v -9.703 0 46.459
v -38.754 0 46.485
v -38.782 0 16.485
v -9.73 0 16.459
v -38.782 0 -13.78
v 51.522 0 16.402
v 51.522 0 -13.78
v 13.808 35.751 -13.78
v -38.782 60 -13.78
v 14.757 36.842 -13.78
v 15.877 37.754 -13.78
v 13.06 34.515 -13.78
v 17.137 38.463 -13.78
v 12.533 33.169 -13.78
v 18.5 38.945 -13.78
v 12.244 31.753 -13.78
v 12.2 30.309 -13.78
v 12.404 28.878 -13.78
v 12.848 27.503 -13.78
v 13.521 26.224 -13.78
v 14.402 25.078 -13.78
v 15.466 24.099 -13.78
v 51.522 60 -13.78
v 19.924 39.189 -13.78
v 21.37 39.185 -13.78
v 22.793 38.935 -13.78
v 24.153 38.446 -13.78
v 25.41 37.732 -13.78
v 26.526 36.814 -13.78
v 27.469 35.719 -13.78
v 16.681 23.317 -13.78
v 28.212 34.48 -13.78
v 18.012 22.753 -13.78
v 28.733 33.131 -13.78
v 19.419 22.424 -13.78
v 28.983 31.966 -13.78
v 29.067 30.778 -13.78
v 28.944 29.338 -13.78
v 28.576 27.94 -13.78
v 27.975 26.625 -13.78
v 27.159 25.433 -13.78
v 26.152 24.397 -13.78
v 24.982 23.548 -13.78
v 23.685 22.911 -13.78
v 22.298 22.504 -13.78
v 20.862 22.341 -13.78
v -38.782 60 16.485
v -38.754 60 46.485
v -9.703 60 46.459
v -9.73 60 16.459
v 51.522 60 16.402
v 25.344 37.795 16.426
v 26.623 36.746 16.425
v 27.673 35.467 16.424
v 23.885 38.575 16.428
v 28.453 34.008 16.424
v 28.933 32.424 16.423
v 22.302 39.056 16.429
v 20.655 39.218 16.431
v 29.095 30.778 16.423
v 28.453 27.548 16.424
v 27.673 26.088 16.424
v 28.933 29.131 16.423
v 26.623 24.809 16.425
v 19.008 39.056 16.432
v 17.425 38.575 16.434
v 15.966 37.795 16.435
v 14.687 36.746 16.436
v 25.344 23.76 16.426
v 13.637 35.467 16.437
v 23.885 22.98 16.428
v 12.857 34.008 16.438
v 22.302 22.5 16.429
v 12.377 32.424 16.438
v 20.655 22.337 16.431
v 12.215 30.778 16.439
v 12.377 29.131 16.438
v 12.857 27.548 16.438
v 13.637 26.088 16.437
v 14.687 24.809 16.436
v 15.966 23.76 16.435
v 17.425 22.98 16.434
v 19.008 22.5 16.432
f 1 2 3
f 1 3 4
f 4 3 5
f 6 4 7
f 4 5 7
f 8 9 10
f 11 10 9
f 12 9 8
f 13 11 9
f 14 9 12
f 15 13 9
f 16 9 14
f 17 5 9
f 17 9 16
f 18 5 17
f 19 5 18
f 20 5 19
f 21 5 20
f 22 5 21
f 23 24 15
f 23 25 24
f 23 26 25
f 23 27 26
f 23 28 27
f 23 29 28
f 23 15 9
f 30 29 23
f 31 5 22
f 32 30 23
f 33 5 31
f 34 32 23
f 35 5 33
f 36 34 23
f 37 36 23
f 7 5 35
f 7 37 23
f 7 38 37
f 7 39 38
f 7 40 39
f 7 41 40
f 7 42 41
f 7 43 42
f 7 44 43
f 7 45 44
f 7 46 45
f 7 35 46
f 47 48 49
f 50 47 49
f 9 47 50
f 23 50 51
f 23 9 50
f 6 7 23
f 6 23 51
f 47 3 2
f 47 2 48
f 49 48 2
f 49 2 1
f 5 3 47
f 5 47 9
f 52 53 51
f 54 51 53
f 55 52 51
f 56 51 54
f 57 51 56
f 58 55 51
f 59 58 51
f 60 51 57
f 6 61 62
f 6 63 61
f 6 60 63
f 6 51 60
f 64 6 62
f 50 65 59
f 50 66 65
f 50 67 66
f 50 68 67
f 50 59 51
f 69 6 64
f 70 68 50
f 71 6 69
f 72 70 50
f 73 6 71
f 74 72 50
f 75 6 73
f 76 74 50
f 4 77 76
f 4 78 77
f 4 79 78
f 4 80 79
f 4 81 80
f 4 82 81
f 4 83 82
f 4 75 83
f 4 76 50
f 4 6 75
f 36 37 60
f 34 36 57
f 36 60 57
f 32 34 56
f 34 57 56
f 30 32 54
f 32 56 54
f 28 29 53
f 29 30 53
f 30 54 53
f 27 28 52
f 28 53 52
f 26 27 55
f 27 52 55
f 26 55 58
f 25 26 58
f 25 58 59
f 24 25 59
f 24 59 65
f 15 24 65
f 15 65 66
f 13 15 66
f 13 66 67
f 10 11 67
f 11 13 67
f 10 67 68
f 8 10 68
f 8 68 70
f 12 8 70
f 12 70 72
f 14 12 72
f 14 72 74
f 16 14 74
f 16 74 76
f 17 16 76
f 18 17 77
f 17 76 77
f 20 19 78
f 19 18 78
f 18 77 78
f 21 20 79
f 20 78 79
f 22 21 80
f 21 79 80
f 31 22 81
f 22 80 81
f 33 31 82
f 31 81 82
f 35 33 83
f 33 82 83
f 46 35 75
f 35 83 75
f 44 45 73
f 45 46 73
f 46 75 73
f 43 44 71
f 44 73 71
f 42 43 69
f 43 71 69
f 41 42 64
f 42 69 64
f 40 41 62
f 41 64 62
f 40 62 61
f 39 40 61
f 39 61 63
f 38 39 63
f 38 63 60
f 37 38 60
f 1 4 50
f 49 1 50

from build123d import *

# Parameters (mm, degrees)
F1_DEPTH = 60
F2_W     = 29.0517922733
F2_H     = 60
F3_DEPTH = 30
F4_R     = 8.4402265008
F5_DEPTH = 49


with BuildPart() as f1:
    # F0 (on Front) → F1 (new body)
    with BuildSketch(Plane.XZ):
        Polygon((51.5215955675, 16.4024308324), (-38.782004267, 16.4853166789), (-38.782004267, -13.7799708173), (51.5215955675, -13.7799708173), align=None)
    extrude(amount=-F1_DEPTH)

    # F2 (on face) → F3 (join)
    with BuildSketch(Plane(origin=(0.0150984883, 0, 16.4497064628), x_dir=(0.9999995788, 0, -0.0009178572), z_dir=(0.0009178572, 0, 0.9999995788))):
        with Locations((-24.2712229612, 30)):
            Rectangle(F2_W, F2_H)
    extrude(amount=F3_DEPTH)

    # F4 (on face) → F5 (cut)
    with BuildSketch(Plane(origin=(0.0150984883, 0, 16.4497064628), x_dir=(0.9999995788, 0, -0.0009178572), z_dir=(0.0009178572, 0, 0.9999995788))):
        with Locations((20.6399001181, 30.7776089758)):
            Circle(F4_R)
    extrude(amount=-F5_DEPTH, mode=Mode.SUBTRACT)


solid = f1.part
